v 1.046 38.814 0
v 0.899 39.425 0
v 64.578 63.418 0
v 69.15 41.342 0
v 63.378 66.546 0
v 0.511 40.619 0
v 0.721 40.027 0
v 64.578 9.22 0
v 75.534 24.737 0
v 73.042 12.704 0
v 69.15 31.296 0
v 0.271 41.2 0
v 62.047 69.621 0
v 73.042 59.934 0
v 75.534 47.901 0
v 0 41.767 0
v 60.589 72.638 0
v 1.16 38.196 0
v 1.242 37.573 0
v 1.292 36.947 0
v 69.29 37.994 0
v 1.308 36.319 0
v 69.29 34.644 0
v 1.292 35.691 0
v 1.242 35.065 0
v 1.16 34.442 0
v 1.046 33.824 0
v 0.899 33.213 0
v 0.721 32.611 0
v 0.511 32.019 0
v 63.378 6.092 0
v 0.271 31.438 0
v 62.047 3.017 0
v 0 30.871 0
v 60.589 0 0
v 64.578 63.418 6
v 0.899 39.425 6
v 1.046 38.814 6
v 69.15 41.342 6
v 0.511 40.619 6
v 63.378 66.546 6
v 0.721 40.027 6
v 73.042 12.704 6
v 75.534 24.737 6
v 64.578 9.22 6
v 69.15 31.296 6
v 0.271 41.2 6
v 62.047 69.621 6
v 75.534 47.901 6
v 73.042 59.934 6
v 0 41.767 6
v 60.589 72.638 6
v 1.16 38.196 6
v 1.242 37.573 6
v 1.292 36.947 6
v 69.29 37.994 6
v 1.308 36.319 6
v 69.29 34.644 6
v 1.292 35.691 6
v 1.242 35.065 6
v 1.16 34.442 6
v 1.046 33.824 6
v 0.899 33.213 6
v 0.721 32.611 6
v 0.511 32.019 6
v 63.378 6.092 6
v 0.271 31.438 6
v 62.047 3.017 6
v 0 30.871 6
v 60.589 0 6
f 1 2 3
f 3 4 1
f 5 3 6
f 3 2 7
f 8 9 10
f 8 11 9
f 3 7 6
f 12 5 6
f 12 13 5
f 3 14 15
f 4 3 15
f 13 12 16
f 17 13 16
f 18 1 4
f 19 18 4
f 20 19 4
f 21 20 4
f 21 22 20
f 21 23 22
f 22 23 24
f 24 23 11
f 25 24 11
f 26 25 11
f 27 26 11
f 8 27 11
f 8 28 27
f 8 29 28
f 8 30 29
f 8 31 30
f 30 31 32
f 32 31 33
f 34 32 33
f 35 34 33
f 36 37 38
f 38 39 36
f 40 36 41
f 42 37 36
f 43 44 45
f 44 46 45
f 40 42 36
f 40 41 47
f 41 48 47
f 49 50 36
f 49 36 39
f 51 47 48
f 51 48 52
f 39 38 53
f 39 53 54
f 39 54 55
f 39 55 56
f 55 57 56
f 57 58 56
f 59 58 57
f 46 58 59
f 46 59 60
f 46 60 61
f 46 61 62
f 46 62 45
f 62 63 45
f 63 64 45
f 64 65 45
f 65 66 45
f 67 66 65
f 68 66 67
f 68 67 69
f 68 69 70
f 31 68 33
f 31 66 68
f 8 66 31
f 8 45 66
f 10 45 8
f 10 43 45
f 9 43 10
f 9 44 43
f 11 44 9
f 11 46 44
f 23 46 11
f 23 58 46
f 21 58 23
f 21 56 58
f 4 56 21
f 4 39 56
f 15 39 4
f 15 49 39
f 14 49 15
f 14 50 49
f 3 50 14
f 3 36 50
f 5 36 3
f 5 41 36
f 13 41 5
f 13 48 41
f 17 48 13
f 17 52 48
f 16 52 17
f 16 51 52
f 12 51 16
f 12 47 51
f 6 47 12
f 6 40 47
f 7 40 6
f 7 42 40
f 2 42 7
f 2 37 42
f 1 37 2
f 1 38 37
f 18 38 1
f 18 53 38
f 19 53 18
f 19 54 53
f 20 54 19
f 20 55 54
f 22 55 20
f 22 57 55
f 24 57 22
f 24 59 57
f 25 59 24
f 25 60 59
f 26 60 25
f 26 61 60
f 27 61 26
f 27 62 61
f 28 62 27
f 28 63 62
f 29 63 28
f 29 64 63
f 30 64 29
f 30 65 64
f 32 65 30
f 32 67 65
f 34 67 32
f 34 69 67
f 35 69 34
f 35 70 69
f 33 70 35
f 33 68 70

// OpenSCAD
$fn = 32;

// ----------------------------------------------------------------------
// Gear sector: 2 teeth on 54 degrees
// ----------------------------------------------------------------------

// --- parameters (mm) ---
sector_angle = 54;        // sector angle, degrees
root_r = 80;              // root circle radius
tooth_h = 7;              // tooth height over the root circle
teeth = 2;                // number of teeth on the sector
hub_r = 12;               // hub bore radius
plate_t = 6;              // sector thickness, Z
arc_step = 3;             // sampling step of the root/hub arcs, degrees

tip_r = root_r + tooth_h;  // tip circle radius

profile = [[60.589, 0], [62.047, 3.017], [63.378, 6.092], [64.578, 9.22], [73.042, 12.704], [75.534, 24.737], [69.15, 31.296], [69.29, 34.644], [69.29, 37.994], [69.15, 41.342], [75.534, 47.901], [73.042, 59.934], [64.578, 63.418], [63.378, 66.546], [62.047, 69.621], [60.589, 72.638], [0, 41.767], [0.271, 41.2], [0.511, 40.619], [0.721, 40.027], [0.899, 39.425], [1.046, 38.814], [1.16, 38.196], [1.242, 37.573], [1.292, 36.947], [1.308, 36.319], [1.292, 35.691], [1.242, 35.065], [1.16, 34.442], [1.046, 33.824], [0.899, 33.213], [0.721, 32.611], [0.511, 32.019], [0.271, 31.438], [0, 30.871]];  // primary outline, 35 points, counter clockwise

// --- the one profile operation ---
linear_extrude(height = plate_t) polygon(points = profile);
